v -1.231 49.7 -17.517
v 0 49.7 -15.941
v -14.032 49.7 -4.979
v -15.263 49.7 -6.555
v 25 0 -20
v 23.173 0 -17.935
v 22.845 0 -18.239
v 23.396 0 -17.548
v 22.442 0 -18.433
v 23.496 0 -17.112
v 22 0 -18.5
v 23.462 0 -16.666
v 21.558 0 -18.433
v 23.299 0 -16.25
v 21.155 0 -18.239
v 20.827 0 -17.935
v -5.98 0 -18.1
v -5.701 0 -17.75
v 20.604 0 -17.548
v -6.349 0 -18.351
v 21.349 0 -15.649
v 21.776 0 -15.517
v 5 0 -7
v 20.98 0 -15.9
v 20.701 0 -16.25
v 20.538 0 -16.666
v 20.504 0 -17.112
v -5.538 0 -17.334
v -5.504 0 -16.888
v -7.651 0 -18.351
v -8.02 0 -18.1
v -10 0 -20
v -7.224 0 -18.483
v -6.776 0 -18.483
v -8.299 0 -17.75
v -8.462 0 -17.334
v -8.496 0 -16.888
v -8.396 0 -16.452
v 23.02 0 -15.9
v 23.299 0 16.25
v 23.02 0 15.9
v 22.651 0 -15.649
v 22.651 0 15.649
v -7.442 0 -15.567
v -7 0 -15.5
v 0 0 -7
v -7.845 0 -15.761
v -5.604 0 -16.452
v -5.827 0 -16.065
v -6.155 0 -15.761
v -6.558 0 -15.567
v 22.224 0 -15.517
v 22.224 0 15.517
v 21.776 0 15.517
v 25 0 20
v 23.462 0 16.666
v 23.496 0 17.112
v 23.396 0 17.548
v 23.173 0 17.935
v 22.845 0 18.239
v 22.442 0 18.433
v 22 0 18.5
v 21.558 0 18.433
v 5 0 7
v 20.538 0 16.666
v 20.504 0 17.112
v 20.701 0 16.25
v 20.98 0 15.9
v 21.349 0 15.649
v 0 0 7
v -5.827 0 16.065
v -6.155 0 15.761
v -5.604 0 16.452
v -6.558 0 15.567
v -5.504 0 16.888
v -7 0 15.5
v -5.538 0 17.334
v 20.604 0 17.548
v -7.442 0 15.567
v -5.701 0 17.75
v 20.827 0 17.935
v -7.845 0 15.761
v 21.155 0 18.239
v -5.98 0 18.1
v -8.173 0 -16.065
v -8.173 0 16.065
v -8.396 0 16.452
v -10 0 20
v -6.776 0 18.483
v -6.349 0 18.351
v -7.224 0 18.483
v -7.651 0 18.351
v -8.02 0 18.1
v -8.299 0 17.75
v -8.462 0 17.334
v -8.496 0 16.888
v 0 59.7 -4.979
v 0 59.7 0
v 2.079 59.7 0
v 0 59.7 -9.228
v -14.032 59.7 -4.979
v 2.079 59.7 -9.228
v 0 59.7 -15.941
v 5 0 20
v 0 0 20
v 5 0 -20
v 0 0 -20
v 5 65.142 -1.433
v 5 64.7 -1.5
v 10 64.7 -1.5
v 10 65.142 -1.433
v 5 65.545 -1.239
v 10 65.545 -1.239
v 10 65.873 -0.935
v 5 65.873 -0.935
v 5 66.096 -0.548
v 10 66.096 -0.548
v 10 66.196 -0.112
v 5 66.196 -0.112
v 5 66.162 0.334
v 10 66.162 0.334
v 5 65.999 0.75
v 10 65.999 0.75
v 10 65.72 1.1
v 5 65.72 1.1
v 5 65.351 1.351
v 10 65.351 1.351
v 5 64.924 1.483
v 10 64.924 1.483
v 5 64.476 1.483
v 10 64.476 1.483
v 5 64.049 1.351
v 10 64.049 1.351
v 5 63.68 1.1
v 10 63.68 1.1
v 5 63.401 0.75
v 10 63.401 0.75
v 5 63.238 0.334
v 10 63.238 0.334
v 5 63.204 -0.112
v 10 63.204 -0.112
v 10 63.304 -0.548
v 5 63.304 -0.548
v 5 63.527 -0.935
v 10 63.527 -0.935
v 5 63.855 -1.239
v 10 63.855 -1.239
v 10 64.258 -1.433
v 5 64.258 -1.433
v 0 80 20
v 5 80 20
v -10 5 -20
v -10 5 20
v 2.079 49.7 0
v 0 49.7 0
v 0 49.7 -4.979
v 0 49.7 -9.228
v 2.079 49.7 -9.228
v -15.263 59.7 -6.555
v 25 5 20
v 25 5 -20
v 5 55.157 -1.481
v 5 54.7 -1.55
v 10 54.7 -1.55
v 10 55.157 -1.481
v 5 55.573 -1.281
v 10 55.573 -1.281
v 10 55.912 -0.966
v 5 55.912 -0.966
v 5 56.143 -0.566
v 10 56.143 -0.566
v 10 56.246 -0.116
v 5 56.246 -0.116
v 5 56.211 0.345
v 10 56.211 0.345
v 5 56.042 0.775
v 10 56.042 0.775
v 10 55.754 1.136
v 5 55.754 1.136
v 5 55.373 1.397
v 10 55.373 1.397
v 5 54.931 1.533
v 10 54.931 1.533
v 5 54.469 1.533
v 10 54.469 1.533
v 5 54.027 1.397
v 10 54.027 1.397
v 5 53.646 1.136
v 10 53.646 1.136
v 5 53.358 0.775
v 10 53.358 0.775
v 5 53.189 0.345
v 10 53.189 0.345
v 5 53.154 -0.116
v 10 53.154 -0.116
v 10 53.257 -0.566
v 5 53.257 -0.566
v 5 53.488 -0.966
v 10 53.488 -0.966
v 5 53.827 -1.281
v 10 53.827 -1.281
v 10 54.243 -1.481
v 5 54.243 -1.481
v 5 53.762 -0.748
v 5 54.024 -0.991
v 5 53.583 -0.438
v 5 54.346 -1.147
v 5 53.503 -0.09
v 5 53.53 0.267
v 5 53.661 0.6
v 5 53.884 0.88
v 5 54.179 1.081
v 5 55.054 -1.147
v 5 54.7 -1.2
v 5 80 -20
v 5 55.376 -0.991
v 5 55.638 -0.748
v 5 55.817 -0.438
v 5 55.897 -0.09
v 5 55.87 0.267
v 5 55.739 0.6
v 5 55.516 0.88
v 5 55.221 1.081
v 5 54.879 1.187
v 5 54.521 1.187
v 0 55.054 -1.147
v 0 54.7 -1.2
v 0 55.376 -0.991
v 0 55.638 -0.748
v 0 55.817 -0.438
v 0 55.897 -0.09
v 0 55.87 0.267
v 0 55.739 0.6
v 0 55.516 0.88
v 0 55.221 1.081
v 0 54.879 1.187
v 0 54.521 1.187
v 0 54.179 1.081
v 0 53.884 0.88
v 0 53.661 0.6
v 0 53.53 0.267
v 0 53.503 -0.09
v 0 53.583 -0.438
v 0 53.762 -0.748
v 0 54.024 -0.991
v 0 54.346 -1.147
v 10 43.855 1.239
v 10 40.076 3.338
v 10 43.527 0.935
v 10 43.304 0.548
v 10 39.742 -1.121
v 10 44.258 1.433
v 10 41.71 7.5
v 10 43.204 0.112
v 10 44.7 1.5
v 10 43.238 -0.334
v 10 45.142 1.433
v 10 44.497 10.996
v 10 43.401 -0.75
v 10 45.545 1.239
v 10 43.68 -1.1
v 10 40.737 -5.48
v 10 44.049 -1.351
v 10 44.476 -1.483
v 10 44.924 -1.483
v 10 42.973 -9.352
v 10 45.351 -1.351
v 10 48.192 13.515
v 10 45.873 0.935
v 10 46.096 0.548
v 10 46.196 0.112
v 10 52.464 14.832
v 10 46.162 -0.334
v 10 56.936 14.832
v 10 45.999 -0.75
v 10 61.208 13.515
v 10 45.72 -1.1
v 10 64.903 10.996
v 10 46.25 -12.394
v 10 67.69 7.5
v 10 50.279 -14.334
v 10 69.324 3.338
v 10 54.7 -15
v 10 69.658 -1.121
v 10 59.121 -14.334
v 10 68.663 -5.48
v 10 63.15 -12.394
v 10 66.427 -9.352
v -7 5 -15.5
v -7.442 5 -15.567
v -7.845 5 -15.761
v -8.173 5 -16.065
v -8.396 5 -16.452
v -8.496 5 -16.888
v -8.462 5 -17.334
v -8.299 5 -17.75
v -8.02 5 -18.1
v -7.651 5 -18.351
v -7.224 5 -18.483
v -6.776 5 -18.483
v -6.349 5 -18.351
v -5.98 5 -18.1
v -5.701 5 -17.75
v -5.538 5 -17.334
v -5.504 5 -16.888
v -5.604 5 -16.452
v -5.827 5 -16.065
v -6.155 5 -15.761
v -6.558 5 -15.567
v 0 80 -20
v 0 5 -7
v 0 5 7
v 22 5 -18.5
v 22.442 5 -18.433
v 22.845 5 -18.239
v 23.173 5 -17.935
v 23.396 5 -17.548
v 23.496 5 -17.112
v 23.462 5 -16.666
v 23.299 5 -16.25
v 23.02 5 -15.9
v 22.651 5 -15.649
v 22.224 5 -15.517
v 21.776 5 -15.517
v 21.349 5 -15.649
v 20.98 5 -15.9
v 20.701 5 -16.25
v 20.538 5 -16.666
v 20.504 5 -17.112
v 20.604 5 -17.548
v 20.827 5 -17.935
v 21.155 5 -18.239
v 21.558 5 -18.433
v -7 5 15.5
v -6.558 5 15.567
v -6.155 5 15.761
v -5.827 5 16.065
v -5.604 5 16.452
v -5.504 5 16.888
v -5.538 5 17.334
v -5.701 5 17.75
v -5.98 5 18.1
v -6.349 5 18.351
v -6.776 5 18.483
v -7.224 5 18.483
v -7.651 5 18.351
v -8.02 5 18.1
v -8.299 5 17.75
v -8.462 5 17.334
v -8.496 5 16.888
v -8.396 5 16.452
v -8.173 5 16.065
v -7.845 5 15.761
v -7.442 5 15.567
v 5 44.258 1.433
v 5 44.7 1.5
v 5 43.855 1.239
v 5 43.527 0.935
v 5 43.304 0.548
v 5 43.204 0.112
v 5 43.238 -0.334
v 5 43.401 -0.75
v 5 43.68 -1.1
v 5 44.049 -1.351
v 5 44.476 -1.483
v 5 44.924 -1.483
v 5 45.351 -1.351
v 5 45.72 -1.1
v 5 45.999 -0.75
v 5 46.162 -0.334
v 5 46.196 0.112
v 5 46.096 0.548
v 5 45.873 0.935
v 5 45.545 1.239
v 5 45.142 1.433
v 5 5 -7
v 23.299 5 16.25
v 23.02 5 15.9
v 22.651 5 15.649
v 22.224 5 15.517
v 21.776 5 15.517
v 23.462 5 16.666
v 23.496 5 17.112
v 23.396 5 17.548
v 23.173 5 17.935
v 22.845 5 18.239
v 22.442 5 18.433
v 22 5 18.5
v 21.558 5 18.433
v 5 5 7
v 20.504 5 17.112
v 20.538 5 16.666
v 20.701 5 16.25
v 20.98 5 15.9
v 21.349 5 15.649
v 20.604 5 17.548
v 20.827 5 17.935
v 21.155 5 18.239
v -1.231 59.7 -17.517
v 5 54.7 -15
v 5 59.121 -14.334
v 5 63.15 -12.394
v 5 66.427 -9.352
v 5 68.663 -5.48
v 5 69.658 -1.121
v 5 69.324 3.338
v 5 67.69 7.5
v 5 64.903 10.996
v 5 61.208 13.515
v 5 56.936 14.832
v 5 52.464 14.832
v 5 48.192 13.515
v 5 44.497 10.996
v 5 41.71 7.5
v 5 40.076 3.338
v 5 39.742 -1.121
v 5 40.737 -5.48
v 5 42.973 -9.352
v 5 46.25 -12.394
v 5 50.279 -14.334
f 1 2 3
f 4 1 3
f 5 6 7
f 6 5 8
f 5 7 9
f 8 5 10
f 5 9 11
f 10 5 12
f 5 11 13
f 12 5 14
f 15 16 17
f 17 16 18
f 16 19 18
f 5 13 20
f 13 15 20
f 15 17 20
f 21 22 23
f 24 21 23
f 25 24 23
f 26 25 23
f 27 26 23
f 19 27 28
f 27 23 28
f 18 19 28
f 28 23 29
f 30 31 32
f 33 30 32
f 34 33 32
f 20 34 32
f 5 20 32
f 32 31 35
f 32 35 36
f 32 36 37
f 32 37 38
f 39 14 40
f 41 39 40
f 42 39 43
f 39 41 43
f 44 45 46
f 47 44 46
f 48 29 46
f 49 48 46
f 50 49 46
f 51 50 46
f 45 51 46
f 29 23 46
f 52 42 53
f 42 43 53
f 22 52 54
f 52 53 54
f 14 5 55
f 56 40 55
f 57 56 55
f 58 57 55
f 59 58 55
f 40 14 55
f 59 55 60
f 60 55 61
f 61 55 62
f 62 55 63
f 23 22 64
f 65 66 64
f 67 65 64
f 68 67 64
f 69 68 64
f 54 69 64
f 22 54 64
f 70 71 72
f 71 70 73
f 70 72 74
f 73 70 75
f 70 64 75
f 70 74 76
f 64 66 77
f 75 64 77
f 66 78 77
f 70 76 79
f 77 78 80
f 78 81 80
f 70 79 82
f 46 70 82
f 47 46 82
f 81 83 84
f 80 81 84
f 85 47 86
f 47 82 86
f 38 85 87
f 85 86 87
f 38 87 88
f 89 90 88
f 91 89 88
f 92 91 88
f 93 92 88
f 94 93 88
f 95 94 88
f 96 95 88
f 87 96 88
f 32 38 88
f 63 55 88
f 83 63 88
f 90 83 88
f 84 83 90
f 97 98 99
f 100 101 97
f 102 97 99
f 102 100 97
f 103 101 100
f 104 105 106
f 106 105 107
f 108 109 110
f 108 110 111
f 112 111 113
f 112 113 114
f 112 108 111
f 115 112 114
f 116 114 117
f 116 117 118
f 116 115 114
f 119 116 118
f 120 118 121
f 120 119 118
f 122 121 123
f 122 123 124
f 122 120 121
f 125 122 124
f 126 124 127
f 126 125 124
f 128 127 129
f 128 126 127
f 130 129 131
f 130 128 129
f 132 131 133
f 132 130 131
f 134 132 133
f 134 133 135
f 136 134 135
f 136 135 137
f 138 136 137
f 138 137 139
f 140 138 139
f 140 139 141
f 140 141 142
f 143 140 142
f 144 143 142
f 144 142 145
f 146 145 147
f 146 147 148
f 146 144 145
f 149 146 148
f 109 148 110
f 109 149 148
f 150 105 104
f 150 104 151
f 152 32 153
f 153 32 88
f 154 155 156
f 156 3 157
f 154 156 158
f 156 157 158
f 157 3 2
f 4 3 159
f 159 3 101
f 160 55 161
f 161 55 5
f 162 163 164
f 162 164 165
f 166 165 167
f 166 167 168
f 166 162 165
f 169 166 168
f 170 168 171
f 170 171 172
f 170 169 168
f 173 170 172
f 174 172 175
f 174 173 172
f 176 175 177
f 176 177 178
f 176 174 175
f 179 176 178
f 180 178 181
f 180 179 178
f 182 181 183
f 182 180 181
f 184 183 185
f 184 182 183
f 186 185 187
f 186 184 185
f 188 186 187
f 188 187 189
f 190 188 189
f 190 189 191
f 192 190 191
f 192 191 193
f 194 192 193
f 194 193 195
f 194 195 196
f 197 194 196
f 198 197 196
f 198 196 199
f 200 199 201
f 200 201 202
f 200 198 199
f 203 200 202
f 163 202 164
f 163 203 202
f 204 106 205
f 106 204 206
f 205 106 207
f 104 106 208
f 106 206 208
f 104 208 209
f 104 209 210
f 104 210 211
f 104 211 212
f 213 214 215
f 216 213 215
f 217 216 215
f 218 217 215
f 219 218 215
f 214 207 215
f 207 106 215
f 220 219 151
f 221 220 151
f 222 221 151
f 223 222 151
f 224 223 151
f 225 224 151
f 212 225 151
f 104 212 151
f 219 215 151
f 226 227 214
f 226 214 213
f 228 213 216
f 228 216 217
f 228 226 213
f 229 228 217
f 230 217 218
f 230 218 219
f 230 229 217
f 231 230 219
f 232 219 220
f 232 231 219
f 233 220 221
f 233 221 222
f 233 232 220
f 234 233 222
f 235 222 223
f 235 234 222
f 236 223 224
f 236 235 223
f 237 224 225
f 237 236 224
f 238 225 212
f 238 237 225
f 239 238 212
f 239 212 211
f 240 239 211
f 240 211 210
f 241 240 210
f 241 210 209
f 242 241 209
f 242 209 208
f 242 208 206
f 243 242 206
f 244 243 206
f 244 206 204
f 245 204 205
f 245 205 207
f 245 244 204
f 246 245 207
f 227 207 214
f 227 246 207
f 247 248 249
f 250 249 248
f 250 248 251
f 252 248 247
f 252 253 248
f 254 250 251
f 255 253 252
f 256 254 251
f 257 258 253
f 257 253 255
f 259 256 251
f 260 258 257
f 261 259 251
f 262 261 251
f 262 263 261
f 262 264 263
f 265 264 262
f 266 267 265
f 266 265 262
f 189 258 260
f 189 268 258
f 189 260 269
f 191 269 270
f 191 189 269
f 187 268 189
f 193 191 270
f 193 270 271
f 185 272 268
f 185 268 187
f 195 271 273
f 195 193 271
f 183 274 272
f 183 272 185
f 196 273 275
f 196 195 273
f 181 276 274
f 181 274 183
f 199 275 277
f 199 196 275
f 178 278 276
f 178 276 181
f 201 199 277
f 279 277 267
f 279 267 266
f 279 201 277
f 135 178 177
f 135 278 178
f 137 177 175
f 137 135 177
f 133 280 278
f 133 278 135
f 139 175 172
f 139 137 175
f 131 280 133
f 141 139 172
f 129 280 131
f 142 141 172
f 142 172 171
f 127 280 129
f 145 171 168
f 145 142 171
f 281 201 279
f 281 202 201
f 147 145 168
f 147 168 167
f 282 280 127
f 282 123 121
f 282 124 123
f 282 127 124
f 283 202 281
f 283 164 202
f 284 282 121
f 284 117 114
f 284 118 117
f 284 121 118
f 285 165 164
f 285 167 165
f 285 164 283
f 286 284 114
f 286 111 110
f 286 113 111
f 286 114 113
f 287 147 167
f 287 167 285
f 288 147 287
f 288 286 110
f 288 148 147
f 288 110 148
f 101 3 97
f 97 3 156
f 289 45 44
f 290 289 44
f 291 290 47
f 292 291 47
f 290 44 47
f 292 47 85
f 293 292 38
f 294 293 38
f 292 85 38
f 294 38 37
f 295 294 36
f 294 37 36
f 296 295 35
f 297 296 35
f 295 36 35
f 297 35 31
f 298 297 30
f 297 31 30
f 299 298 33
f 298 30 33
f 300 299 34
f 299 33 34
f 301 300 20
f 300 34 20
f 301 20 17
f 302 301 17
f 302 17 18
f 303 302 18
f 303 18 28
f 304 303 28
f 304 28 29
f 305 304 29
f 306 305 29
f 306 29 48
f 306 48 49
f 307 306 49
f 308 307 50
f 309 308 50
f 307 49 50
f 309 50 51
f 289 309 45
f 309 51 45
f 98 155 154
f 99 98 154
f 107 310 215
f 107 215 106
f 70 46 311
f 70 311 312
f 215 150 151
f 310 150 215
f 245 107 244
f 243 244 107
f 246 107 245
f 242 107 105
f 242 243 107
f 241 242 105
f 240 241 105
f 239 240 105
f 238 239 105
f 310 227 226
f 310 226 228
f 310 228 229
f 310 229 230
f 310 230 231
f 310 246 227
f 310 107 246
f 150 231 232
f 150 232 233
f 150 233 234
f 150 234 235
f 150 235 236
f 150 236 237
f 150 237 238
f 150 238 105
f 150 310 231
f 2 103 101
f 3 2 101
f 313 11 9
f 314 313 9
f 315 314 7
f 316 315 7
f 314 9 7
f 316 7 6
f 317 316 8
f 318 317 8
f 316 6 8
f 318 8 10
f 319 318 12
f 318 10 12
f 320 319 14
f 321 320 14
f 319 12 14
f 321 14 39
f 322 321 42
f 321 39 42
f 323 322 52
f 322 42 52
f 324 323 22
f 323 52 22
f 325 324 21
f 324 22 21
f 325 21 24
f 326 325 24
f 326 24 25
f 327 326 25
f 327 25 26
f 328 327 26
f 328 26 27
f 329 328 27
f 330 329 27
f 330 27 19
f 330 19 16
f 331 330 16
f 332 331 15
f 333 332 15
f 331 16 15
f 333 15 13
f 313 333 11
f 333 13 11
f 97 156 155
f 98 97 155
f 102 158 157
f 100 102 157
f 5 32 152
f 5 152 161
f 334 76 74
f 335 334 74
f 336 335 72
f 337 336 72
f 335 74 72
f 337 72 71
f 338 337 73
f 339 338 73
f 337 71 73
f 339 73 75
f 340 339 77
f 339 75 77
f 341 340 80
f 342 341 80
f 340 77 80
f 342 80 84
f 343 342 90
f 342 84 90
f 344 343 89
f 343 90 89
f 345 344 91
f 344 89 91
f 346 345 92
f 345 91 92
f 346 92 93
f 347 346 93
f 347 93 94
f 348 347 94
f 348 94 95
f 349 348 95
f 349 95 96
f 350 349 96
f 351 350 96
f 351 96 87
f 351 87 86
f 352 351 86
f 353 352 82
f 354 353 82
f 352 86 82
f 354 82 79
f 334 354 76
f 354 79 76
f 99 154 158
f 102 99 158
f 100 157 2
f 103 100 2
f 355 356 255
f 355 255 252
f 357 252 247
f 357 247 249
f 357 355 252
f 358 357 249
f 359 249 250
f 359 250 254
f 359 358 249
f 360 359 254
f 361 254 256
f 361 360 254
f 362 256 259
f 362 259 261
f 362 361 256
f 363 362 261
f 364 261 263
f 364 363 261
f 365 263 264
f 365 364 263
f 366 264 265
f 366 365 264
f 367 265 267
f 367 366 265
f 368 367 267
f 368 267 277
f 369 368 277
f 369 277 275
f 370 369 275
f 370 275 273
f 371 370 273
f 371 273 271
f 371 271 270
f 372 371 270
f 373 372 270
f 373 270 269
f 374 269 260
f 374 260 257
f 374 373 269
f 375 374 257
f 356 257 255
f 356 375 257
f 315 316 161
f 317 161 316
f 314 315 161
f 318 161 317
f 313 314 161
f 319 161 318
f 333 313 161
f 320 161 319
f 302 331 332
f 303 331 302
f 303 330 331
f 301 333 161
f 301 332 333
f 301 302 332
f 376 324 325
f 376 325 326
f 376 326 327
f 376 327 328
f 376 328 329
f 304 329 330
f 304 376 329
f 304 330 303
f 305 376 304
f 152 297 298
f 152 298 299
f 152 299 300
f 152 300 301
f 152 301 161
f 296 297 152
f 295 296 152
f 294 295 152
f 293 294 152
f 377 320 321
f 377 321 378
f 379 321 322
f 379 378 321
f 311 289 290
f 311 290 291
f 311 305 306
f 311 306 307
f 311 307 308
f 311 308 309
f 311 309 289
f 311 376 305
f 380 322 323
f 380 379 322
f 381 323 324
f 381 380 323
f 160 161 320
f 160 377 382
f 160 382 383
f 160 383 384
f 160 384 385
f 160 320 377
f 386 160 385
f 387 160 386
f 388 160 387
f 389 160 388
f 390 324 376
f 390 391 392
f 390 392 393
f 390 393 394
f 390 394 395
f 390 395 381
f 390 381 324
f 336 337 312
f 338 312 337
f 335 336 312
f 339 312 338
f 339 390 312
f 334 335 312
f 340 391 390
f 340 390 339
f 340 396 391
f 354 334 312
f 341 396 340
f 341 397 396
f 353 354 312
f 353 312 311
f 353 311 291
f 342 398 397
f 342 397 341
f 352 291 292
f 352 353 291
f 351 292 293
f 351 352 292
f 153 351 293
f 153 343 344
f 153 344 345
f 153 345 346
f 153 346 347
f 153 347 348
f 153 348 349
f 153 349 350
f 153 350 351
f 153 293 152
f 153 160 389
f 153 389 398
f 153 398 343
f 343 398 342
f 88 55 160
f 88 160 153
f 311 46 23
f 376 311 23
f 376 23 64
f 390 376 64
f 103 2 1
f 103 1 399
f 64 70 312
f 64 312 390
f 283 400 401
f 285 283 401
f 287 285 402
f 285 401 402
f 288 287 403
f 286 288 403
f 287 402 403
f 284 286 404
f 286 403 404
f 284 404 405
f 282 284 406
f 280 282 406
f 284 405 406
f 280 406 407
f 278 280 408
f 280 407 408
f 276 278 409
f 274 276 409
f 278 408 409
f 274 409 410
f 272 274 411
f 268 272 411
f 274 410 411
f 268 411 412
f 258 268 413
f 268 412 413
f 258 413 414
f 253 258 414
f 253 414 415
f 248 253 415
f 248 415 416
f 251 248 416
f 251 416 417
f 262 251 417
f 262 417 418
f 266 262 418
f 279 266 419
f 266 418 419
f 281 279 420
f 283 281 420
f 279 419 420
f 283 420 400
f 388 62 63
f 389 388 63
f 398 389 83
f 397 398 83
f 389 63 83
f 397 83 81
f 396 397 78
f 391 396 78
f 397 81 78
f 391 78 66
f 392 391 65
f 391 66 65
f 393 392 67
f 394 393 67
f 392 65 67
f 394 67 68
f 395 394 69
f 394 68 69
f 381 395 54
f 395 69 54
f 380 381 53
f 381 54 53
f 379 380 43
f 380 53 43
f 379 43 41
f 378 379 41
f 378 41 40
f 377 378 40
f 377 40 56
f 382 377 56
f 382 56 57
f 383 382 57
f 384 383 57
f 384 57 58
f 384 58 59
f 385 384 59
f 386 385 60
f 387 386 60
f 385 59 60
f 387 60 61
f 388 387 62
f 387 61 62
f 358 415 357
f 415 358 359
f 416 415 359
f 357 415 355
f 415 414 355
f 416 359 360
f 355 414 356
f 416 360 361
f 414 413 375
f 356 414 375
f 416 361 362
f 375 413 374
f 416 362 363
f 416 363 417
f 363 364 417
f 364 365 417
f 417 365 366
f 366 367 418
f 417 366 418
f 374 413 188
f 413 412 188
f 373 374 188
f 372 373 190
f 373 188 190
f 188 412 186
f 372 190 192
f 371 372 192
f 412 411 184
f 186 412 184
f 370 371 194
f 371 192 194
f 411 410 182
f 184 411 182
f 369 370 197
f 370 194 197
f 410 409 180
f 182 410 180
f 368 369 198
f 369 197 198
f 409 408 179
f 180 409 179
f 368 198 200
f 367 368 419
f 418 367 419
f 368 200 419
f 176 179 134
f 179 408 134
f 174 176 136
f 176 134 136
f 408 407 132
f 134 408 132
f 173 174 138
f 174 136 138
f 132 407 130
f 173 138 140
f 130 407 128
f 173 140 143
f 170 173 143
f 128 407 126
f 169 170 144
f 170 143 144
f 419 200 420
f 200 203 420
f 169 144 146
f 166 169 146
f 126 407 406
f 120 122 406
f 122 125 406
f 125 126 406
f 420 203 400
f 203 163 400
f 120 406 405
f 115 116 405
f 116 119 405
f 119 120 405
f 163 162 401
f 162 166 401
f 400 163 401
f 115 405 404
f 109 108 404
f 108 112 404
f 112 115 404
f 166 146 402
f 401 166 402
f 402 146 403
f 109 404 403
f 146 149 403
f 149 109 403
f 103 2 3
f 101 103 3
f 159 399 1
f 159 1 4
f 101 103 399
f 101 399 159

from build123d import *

# Parameters (mm, degrees)
SKETCH1_R                = 1.2
BOSS_EXTRUDE1_DEPTH      = 5
SKETCH4_R                = 1.5
SKETCH4_W                = 5
SKETCH4_H                = 14
BOSS_EXTRUDE2_DEPTH      = 5
BOSS_EXTRUDE3_DEPTH      = 5
BOSS_EXTRUDE3_DEPTH_BACK = 5
SKETCH10_R               = 15
SKETCH10_R_2             = 1.55
SKETCH10_R_3             = 1.5
BOSS_EXTRUDE5_DEPTH      = 5
SKETCH12_W               = 17.806233138
SKETCH12_H               = 10
BOSS_EXTRUDE6_DEPTH      = 2


with BuildPart() as part:
    # Sketch1 → Boss-Extrude1 (new body)
    with BuildSketch(Plane(origin=(0, 0, 0), x_dir=(0, 0, -1), z_dir=(1, 0, 0))):
        Polygon((0, 0), (-20, 0), (-20, 80), (20, 80), (20, 0), align=None)
        with Locations((0, 54.7)):
            Circle(SKETCH1_R, mode=Mode.SUBTRACT)
    extrude(amount=BOSS_EXTRUDE1_DEPTH)


with BuildPart() as body_2:
    # Sketch4 → Boss-Extrude2 (new body)
    with BuildSketch(Plane.XZ):
        Polygon((5, 20), (25, 20), (25, -20), (5, -20), (-10, -20), (-10, 20), align=None)
        with Locations(Location((-7, 17, 0), (0, 0, 270))):
            Circle(SKETCH4_R, mode=Mode.SUBTRACT)
        with Locations(Location((-7, -17, 0), (0, 0, 90))):
            Circle(SKETCH4_R, mode=Mode.SUBTRACT)
        with Locations(Location((22, -17, 0), (0, 0, 270))):
            Circle(SKETCH4_R, mode=Mode.SUBTRACT)
        with Locations(Location((22, 17, 0), (0, 0, 90))):
            Circle(SKETCH4_R, mode=Mode.SUBTRACT)
        with Locations((2.5, 0)):
            Rectangle(SKETCH4_W, SKETCH4_H, mode=Mode.SUBTRACT)
    extrude(amount=-BOSS_EXTRUDE2_DEPTH)


with BuildPart() as body_3:
    # Sketch8 → Boss-Extrude3 (new, two sides: drawn at the far end of the back side and taken through both)
    with BuildSketch(Plane(origin=(0, 54.7, 0), x_dir=(1, 0, 0), z_dir=(0, 1, 0)).offset(-BOSS_EXTRUDE3_DEPTH_BACK)):
        Polygon((-14.031503195, 4.978859287), (0, 4.978859287), (0, 0), (2.078626706, 0), (2.078626706, 9.227659687), (0, 9.227659687), (0, 15.941471051), align=None)
    extrude(amount=BOSS_EXTRUDE3_DEPTH + BOSS_EXTRUDE3_DEPTH_BACK)


with BuildPart() as body_4:
    # Sketch10 → Boss-Extrude5 (new body)
    with BuildSketch(Plane(origin=(5, 0, 0), x_dir=(0, 0, -1), z_dir=(1, 0, 0))):
        with Locations((0, 54.7)):
            Circle(SKETCH10_R)
        with Locations((0, 54.7)):
            Circle(SKETCH10_R_2, mode=Mode.SUBTRACT)
        with Locations((0, 64.7)):
            Circle(SKETCH10_R_3, mode=Mode.SUBTRACT)
        with Locations(Location((0, 44.7, 0), (0, 0, 180))):
            Circle(SKETCH10_R_3, mode=Mode.SUBTRACT)
    extrude(amount=BOSS_EXTRUDE5_DEPTH)


with BuildPart() as body_5:
    # Sketch12 → Boss-Extrude6 (new body)
    with BuildSketch(Plane(origin=(-7.733970616, 0, -9.899030973), x_dir=(-0.7880107536067256, 0, 0.6156614753256539), z_dir=(-0.6156614753256537, 0, -0.7880107536067255))):
        with Locations((-0.911433017, 54.7)):
            Rectangle(SKETCH12_W, SKETCH12_H)
    extrude(amount=BOSS_EXTRUDE6_DEPTH)


solid = Compound([part.part, body_2.part, body_3.part, body_4.part, body_5.part])
